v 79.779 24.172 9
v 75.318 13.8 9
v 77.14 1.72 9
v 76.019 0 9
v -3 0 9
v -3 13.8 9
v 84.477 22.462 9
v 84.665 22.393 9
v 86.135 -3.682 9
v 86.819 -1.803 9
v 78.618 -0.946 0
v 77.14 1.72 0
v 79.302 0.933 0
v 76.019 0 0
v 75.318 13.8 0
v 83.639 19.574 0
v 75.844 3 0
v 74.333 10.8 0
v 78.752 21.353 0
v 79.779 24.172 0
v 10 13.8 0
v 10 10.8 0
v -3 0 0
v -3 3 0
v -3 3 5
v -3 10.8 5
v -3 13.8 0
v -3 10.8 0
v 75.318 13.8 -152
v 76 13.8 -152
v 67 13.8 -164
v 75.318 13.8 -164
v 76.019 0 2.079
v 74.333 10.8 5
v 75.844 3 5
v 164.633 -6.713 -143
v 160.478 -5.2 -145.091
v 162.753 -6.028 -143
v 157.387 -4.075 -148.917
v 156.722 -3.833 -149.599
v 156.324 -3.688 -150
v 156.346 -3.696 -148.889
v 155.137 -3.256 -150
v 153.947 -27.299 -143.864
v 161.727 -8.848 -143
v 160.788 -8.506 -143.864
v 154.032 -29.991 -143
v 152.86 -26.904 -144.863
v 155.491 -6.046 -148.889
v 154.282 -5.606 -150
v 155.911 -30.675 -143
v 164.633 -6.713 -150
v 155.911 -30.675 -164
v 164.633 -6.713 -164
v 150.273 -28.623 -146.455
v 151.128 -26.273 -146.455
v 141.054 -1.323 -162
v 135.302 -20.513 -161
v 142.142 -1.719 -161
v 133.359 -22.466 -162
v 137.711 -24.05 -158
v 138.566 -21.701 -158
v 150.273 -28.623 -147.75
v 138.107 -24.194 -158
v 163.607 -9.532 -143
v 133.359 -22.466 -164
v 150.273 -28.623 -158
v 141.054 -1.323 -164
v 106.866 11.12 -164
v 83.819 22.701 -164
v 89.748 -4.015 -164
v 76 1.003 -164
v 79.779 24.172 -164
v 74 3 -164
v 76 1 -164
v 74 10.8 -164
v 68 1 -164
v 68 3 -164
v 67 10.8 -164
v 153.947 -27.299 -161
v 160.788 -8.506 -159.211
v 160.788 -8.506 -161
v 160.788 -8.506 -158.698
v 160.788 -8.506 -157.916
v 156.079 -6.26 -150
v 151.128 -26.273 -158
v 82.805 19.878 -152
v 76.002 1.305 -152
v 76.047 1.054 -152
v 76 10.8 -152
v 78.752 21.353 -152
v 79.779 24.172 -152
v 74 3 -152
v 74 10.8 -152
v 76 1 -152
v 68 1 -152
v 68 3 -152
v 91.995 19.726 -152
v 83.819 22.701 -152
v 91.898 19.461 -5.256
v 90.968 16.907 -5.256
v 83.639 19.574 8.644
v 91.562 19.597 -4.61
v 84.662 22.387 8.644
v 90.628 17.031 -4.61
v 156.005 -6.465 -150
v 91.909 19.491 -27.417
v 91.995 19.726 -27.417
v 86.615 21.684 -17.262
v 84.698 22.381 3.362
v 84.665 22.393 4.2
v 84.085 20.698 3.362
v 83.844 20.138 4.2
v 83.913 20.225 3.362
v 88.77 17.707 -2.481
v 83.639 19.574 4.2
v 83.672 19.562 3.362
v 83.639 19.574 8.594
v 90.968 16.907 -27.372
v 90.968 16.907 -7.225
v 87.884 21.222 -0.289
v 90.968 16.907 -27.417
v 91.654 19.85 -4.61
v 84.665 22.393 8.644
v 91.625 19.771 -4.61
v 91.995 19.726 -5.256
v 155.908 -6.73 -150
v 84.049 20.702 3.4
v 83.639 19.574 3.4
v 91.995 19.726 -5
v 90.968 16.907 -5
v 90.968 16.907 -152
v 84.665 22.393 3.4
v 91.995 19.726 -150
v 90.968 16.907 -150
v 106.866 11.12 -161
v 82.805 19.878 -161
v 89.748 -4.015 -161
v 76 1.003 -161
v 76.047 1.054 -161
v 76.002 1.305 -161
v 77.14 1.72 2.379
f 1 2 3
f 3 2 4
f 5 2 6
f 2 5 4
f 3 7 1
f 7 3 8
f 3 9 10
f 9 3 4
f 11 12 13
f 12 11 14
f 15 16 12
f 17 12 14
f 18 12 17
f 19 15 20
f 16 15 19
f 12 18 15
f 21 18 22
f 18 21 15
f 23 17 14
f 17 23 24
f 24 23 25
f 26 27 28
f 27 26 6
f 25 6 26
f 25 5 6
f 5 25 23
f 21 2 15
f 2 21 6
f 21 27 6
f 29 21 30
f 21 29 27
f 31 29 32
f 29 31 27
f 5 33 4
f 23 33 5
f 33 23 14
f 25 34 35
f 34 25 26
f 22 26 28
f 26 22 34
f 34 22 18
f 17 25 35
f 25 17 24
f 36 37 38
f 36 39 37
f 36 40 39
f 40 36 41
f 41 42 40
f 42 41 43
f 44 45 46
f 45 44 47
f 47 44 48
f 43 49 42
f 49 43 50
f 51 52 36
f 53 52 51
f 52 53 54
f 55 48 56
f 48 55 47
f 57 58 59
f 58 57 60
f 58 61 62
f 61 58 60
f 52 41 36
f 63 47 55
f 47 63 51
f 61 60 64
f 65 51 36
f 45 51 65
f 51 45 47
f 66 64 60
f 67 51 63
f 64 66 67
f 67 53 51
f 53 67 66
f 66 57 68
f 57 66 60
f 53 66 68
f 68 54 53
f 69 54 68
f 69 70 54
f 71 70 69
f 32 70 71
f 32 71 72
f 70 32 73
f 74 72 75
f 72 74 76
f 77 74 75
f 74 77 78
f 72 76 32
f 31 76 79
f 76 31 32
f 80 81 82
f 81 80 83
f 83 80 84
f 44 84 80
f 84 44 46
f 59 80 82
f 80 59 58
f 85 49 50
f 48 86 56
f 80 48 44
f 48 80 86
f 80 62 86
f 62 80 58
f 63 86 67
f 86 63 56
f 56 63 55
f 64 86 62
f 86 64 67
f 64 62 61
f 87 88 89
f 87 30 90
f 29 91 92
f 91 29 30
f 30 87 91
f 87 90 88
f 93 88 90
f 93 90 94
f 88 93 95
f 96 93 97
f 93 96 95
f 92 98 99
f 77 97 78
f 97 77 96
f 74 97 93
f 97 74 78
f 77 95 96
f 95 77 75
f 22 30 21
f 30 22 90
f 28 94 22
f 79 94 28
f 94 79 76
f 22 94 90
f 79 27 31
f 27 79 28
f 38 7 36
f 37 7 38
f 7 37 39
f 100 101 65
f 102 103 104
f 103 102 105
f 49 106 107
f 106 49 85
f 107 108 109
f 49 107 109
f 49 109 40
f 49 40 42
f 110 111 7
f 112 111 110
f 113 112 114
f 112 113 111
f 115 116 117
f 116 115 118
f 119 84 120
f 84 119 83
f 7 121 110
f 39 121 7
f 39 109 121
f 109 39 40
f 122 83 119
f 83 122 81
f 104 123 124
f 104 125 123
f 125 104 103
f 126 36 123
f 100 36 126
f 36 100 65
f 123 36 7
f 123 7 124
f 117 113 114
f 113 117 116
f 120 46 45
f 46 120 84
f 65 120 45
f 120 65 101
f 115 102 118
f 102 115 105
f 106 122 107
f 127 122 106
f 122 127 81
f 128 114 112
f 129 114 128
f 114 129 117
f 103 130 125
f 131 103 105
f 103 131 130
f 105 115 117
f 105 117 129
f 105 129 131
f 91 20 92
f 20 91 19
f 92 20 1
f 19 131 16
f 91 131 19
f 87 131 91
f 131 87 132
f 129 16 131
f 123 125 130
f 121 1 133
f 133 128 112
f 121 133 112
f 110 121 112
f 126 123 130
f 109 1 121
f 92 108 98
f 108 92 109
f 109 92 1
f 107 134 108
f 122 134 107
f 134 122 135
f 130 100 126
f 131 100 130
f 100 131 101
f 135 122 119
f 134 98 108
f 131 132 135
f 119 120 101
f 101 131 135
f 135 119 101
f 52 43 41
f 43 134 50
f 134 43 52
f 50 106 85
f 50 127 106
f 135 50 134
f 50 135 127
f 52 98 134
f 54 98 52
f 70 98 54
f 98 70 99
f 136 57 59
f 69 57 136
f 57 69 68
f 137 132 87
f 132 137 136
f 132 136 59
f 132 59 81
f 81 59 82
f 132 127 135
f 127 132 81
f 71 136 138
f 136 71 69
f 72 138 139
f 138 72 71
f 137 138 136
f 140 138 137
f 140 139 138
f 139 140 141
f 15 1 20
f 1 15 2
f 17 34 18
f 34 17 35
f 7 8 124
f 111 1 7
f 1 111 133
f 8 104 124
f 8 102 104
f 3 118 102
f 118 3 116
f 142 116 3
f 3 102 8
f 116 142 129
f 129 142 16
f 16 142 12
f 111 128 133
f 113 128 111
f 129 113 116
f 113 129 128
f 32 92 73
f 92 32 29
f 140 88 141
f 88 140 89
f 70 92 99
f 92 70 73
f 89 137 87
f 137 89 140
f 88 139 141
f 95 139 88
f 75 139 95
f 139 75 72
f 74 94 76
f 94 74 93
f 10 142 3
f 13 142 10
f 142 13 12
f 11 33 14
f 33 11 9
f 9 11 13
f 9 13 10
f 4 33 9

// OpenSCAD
phoneLength=170; // 155
phoneWidth=81; // 75
phoneThickness=18.5; // 12
laptopThickness=7.8; // 5
clipWidth=80; // 70

/* [Hidden] */
materialThickness=3; // 3
clipHeight=9; // 9


difference() {
        translate([+77-clipWidth,0,0])
    cube([clipWidth,6+laptopThickness,clipHeight]);
    translate([-391,+3,-1])
        cube([1000,+laptopThickness,-3+clipHeight]);
    translate([0,-1,-7])
        cube([0,24+laptopThickness,28]);
  }
//bottom retaining clip
        translate([-8+76,+1,-3+clipHeight-phoneLength])
    cube([6.5,-1+materialThickness,9+materialThickness]);

//Laptop cross-bar
rotate([90,0,0])
translate([0,0,-6-laptopThickness])
linear_extrude(height=materialThickness, center=false, convexity=1, scale=[0], $fn=1)
polygon( points=[
            [77-clipWidth,0],
            [90-clipWidth,0],
            [76,5-phoneLength+13],
            [76,clipHeight-materialThickness-phoneLength],
            [-9+76,clipHeight-materialThickness-phoneLength]] );

//Phone cross-bar
rotate([90,0,0])
rotate([0,-20,0])
translate([-9.3,0,-30-phoneThickness])
linear_extrude(height=materialThickness, center=true, convexity=1, scale=[0], $fn=1)
polygon( points=[
            [82,-15],
            [81,0+clipHeight],
            [9.3+76+phoneWidth,14-phoneLength+13],
            [9.3+76+phoneWidth,9-phoneLength-materialThickness],
            [+9+76+phoneWidth,+9-phoneLength-materialThickness]] );

//Down-bar
rotate([90,0,0])
rotate([0,-20,0])
translate([-9.3,-1.0,-30-phoneThickness])
linear_extrude(height=materialThickness, center=true, convexity=0, scale=[0], $fn=1)
polygon( points=[   [89,-4],
                    [+0+76,clipHeight+1],
                    [0+76,19-phoneLength],
                    [3+76+10,19-phoneLength]] );
                    
//Phone bottom-bar
rotate([0,0,-20])
translate([-9+76,+28.5+phoneThickness,3-phoneLength+materialThickness])
cube([9+phoneWidth,3,14]);

//Clipbox
difference() {
    rotate([90,0,0])
    rotate([0,-20,0])
    translate([-13,+0,-31.5-phoneThickness])
    linear_extrude(height=+7+phoneThickness, center=false, convexity=0, scale=[0], $fn=1)
    polygon( points=[   [13+phoneWidth+76,0+clipHeight-materialThickness-phoneLength],
                        [13+76+phoneWidth,27-phoneLength],
                [+11+76+phoneWidth,27-phoneLength],
                [-11+76+phoneWidth,+2+clipHeight-materialThickness-phoneLength],
                    [-11+76+phoneWidth,+0+clipHeight-materialThickness-phoneLength]

    ] );
                
    rotate([0,0,-20])
    translate([62.0,+27,3+clipHeight-phoneLength-materialThickness])
    cube([+11+phoneWidth,+2+phoneThickness,+27]);
    rotate([0,0,-20])
        translate([26,8,26-phoneLength])
    cube([-3+phoneWidth,6+phoneThickness,11]);
    // visible cutout
            rotate([0,0,-20])
        translate([-4+76,+24,+12-phoneLength])
    cube([-2+phoneWidth,+5,25]);
}

//bottom left phone rest
rotate([0,0,-17])
        translate([-2,+10.1,10.5-phoneLength-materialThickness])
    linear_extrude(height=3, center=true, convexity=0, scale=[0], $fn=1)
    polygon( points=[   [-2+76,13.1],
                        [13.0+76,12.3],
                [26+76,15+phoneThickness],
                [-4+76,17+phoneThickness],]);
                
//left phone face/chamfer
//top phoneThickness bracket
rotate([0,0,-20])
    linear_extrude(height=9.0, convexity=0, scale=[0], $fn=1)
    polygon( points=[   [-9.3+76,31.5+phoneThickness],
                        [-4.1+76,31.5+phoneThickness],
                [-4.1+76,+26.0],
                [-10.1+76,+36],
                ] );
//top laptopThickness bracket
    linear_extrude(height=9.0, convexity=0, scale=[0], $fn=1)

    polygon( points=[   [+0+76,6+laptopThickness],
                        [2+76,4.3+laptopThickness],
                [+0+76,+1],
//                [-3+76,+8],
                ] );
//bottom phoneThickness bracket
translate([0,0,6-phoneLength])
rotate([0,0,-20])
    linear_extrude(height=12.0, convexity=0, scale=[0], $fn=1)

    polygon( points=[   [-9.3+76,31.5+phoneThickness],
                        [-5+76,31.5+phoneThickness],
                [-4.9+76,+27.0],
                [-10.1+76,+36],
                ] );

//bottom laptopThickness bracket
translate([0,0,+6-phoneLength])
    linear_extrude(height=12.0, convexity=0, scale=[0], $fn=1)
    polygon( points=[   [-2+76,6+laptopThickness],
                        [0.1+76,+6.0+laptopThickness],
                [+0+76,+1],
                [-2+76,+1],
                ] );

//top phone retainer
rotate([90,0,0])
rotate([0,-20,0])
        translate([+2.2,-6,-27])
    linear_extrude(height=2, center=true, convexity=0, scale=[0], $fn=1)
    polygon( points=[   [-10+76,-3+clipHeight],
                        [-4+76,-3+clipHeight],
                        [+4+76,6+clipHeight],
                [-10+76,6+clipHeight],] );
                
                
////pixel6a
//color([0.3,0.3,0.3])
//rotate([0,0,+70])
//translate([28,4-phoneWidth-76,+9-phoneLength])
//cube([phoneThickness,phoneWidth,phoneLength]);
////screen
//color([0.1,+0.1,0.1],0.8)
//rotate([0,0,+70])
//translate([27.8,7-phoneWidth-76,+12-phoneLength])
//cube([phoneThickness,-6+phoneWidth,-6+phoneLength]);
//
////laptop top
//color("Grey")
//rotate([0,0,90])
//translate([+3.0,-75-phoneWidth+76,-295])
//cube([laptopThickness,400,300]);
////screen
//color([0.1,+0.1,0.1],1.8)
//rotate([0,0,90])
//translate([+2.9,-66-phoneWidth+76,-276])
//cube([laptopThickness,380,270]);
////laptop bottom
//color("Grey")
//rotate([0,77,90])
//translate([+278,+1-phoneWidth,-373])
//cube([20,399,317]);
